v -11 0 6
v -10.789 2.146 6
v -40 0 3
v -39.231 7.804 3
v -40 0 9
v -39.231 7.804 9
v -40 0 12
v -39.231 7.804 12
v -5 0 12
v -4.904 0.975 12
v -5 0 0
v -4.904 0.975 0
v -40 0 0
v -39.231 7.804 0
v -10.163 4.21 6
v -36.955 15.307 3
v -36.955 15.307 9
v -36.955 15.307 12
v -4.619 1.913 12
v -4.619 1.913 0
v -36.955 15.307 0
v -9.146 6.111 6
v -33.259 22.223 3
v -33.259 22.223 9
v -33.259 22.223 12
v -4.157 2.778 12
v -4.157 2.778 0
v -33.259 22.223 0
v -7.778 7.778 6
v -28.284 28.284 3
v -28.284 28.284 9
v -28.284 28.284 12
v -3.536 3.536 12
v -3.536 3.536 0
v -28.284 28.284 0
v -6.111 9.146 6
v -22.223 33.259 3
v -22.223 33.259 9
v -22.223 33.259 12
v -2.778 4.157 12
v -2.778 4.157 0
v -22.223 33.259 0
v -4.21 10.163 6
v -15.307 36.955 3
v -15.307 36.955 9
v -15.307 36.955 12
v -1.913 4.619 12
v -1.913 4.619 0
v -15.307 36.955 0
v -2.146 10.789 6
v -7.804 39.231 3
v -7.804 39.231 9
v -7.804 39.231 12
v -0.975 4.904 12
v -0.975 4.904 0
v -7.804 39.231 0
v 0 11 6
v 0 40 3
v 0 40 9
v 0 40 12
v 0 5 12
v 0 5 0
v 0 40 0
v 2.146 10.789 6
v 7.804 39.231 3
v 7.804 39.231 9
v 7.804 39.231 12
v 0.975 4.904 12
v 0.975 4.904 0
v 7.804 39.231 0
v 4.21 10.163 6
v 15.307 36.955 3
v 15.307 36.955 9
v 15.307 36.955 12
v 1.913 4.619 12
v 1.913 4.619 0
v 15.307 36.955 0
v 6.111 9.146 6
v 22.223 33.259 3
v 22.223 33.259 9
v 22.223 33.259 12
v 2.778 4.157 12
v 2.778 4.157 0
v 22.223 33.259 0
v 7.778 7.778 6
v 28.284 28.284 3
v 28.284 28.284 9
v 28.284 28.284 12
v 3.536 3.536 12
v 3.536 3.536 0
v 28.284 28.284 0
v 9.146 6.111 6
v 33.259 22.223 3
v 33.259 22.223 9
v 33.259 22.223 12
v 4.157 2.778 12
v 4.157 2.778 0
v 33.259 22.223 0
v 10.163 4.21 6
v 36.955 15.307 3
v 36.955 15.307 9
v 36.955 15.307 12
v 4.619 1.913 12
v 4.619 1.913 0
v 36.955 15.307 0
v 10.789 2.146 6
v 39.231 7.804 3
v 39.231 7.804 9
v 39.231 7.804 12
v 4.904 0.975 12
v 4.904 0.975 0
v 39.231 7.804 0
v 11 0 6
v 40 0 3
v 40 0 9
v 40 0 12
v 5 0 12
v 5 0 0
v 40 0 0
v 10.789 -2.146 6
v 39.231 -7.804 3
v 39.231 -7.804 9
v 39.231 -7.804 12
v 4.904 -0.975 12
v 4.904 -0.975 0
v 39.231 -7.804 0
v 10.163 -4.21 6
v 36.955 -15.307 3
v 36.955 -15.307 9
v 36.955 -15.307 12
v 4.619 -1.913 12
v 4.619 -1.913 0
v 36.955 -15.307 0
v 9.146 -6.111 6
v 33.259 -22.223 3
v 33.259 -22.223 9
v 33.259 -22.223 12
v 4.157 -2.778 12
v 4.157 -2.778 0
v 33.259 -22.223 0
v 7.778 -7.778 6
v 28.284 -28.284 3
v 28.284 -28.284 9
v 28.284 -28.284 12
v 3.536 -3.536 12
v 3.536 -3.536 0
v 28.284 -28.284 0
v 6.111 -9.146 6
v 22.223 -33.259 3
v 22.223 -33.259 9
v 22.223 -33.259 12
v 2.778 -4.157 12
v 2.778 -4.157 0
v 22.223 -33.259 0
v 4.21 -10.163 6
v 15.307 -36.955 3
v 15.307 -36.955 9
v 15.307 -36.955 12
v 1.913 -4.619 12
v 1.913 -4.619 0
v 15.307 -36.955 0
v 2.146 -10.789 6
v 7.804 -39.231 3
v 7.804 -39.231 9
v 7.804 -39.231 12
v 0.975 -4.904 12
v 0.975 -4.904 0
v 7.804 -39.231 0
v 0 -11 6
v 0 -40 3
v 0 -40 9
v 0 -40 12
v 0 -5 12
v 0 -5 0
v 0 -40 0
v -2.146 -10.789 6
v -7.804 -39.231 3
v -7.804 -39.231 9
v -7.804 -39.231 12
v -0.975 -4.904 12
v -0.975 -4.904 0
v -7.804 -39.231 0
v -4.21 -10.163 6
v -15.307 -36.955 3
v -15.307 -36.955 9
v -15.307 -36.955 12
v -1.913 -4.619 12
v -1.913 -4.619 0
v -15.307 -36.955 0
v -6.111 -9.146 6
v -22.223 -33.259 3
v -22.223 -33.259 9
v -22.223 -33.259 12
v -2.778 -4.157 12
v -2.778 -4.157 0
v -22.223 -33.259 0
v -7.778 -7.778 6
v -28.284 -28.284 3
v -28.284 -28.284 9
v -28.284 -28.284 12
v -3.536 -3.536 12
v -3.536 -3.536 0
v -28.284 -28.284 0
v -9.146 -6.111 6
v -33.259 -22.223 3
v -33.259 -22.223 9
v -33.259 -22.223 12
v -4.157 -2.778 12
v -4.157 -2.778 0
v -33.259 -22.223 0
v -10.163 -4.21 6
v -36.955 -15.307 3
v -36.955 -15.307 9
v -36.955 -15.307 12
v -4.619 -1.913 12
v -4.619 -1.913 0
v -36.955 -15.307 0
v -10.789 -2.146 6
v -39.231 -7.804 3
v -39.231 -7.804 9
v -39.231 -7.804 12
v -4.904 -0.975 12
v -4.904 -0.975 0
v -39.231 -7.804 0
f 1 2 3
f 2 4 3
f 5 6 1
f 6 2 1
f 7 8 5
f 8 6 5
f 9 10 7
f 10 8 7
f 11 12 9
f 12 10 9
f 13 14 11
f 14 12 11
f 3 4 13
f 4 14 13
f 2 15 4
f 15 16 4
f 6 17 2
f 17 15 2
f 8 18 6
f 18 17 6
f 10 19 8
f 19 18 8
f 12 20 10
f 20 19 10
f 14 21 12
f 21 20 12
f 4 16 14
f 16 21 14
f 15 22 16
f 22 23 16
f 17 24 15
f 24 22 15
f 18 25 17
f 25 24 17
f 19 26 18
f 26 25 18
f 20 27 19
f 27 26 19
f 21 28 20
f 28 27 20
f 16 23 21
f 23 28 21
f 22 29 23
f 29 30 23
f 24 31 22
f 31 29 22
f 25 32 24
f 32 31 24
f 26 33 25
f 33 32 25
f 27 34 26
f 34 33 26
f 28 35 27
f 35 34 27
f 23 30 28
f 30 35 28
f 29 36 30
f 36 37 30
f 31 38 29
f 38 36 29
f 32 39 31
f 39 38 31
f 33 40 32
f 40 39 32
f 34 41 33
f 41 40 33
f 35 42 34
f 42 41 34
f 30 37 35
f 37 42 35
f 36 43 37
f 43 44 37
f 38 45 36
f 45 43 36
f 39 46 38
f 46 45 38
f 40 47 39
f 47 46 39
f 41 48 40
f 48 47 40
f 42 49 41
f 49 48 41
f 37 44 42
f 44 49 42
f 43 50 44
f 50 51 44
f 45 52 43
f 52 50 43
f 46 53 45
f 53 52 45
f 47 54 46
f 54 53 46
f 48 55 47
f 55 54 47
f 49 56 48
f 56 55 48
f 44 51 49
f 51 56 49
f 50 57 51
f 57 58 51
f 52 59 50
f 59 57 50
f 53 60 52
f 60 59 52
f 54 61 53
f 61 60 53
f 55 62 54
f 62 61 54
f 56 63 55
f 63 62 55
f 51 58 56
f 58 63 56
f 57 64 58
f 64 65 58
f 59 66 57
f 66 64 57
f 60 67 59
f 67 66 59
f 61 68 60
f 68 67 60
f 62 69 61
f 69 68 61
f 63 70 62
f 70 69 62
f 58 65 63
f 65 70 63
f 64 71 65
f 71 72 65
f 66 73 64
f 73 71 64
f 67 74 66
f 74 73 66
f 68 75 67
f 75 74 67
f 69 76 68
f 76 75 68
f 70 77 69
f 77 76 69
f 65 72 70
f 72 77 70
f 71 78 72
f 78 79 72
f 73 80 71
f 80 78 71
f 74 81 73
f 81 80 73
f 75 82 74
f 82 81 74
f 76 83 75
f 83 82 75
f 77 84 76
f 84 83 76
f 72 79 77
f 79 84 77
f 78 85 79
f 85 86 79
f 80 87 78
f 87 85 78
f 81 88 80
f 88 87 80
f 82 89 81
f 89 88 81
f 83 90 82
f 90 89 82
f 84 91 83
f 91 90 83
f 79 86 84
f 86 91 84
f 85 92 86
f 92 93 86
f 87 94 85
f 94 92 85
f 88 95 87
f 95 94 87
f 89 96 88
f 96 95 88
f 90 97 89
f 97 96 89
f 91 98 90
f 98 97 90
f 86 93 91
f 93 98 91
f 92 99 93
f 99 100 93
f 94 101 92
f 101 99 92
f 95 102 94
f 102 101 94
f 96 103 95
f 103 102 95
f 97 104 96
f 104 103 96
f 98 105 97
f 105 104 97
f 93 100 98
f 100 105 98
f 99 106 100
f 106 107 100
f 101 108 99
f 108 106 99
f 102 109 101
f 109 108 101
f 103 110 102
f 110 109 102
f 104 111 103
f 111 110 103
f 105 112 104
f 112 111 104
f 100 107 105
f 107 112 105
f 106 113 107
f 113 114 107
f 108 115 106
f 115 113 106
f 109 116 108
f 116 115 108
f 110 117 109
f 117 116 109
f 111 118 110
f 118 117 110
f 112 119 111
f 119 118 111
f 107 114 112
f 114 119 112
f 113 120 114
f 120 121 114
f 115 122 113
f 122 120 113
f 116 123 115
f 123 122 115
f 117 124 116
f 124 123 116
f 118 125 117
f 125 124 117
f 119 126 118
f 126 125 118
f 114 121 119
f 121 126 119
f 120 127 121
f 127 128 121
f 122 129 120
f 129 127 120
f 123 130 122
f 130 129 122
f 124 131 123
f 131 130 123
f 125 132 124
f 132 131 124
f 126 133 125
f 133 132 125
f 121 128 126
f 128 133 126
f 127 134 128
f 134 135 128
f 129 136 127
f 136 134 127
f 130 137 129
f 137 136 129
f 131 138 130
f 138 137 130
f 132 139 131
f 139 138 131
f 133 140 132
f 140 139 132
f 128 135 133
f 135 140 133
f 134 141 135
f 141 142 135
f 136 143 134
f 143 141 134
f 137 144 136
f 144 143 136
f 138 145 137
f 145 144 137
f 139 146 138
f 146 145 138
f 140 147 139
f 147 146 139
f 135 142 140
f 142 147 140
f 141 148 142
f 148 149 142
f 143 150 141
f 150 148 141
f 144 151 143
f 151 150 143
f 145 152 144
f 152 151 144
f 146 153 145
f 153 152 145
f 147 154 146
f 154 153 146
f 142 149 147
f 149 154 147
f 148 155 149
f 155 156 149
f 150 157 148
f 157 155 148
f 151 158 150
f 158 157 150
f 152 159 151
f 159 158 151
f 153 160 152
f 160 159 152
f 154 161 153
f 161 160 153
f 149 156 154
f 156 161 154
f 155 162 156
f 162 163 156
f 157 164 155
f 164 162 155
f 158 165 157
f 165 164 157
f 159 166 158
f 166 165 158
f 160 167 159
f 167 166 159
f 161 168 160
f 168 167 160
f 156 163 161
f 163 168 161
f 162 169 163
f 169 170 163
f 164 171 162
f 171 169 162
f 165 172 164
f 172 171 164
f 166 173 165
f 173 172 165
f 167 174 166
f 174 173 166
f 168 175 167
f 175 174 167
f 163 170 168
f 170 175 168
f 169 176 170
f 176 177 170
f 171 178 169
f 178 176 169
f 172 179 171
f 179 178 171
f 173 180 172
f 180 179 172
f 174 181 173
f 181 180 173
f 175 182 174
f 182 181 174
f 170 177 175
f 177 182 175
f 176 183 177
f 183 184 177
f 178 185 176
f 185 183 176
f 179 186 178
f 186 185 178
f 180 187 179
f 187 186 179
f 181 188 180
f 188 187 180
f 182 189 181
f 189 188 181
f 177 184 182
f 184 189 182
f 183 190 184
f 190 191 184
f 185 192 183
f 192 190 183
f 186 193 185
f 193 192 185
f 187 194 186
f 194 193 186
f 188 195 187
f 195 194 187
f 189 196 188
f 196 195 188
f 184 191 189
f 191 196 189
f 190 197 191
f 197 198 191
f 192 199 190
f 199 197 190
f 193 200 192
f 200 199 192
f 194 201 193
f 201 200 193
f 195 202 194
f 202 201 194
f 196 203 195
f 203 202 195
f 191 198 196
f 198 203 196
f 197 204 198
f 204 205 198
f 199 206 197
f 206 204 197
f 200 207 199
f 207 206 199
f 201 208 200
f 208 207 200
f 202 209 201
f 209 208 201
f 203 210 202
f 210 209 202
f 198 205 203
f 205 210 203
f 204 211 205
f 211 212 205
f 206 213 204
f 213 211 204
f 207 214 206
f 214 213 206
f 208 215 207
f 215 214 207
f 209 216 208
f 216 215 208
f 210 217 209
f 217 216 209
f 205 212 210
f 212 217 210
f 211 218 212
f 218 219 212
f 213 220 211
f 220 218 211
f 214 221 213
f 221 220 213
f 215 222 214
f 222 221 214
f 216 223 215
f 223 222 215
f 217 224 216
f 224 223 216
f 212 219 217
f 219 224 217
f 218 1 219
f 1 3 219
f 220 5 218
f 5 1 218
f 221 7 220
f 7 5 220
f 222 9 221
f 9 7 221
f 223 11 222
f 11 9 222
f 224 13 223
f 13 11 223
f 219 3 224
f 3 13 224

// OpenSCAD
$fn = 32;

// ----------------------------------------------------------------------
// Revolved part: V-groove pulley R40
// ----------------------------------------------------------------------

// --- parameters (mm) ---
bore_r = 5;               // bore radius
rim_r = 40;               // rim radius
rim_t = 12;               // rim width
groove_r = 11;            // groove root radius
groove_w = 3;             // groove half width
revolve_angle = 360;      // revolve sweep, degrees

bore_d = 2 * bore_r;
rim_d = 2 * rim_r;
groove_d = 2 * groove_r;

profile = [[5, 0], [40, 0], [40, 3], [11, 6], [40, 9], [40, 12], [5, 12]];  // primary outline, 7 points, counter clockwise

// --- the one profile operation ---
rotate_extrude(angle = revolve_angle) polygon(points = profile);
